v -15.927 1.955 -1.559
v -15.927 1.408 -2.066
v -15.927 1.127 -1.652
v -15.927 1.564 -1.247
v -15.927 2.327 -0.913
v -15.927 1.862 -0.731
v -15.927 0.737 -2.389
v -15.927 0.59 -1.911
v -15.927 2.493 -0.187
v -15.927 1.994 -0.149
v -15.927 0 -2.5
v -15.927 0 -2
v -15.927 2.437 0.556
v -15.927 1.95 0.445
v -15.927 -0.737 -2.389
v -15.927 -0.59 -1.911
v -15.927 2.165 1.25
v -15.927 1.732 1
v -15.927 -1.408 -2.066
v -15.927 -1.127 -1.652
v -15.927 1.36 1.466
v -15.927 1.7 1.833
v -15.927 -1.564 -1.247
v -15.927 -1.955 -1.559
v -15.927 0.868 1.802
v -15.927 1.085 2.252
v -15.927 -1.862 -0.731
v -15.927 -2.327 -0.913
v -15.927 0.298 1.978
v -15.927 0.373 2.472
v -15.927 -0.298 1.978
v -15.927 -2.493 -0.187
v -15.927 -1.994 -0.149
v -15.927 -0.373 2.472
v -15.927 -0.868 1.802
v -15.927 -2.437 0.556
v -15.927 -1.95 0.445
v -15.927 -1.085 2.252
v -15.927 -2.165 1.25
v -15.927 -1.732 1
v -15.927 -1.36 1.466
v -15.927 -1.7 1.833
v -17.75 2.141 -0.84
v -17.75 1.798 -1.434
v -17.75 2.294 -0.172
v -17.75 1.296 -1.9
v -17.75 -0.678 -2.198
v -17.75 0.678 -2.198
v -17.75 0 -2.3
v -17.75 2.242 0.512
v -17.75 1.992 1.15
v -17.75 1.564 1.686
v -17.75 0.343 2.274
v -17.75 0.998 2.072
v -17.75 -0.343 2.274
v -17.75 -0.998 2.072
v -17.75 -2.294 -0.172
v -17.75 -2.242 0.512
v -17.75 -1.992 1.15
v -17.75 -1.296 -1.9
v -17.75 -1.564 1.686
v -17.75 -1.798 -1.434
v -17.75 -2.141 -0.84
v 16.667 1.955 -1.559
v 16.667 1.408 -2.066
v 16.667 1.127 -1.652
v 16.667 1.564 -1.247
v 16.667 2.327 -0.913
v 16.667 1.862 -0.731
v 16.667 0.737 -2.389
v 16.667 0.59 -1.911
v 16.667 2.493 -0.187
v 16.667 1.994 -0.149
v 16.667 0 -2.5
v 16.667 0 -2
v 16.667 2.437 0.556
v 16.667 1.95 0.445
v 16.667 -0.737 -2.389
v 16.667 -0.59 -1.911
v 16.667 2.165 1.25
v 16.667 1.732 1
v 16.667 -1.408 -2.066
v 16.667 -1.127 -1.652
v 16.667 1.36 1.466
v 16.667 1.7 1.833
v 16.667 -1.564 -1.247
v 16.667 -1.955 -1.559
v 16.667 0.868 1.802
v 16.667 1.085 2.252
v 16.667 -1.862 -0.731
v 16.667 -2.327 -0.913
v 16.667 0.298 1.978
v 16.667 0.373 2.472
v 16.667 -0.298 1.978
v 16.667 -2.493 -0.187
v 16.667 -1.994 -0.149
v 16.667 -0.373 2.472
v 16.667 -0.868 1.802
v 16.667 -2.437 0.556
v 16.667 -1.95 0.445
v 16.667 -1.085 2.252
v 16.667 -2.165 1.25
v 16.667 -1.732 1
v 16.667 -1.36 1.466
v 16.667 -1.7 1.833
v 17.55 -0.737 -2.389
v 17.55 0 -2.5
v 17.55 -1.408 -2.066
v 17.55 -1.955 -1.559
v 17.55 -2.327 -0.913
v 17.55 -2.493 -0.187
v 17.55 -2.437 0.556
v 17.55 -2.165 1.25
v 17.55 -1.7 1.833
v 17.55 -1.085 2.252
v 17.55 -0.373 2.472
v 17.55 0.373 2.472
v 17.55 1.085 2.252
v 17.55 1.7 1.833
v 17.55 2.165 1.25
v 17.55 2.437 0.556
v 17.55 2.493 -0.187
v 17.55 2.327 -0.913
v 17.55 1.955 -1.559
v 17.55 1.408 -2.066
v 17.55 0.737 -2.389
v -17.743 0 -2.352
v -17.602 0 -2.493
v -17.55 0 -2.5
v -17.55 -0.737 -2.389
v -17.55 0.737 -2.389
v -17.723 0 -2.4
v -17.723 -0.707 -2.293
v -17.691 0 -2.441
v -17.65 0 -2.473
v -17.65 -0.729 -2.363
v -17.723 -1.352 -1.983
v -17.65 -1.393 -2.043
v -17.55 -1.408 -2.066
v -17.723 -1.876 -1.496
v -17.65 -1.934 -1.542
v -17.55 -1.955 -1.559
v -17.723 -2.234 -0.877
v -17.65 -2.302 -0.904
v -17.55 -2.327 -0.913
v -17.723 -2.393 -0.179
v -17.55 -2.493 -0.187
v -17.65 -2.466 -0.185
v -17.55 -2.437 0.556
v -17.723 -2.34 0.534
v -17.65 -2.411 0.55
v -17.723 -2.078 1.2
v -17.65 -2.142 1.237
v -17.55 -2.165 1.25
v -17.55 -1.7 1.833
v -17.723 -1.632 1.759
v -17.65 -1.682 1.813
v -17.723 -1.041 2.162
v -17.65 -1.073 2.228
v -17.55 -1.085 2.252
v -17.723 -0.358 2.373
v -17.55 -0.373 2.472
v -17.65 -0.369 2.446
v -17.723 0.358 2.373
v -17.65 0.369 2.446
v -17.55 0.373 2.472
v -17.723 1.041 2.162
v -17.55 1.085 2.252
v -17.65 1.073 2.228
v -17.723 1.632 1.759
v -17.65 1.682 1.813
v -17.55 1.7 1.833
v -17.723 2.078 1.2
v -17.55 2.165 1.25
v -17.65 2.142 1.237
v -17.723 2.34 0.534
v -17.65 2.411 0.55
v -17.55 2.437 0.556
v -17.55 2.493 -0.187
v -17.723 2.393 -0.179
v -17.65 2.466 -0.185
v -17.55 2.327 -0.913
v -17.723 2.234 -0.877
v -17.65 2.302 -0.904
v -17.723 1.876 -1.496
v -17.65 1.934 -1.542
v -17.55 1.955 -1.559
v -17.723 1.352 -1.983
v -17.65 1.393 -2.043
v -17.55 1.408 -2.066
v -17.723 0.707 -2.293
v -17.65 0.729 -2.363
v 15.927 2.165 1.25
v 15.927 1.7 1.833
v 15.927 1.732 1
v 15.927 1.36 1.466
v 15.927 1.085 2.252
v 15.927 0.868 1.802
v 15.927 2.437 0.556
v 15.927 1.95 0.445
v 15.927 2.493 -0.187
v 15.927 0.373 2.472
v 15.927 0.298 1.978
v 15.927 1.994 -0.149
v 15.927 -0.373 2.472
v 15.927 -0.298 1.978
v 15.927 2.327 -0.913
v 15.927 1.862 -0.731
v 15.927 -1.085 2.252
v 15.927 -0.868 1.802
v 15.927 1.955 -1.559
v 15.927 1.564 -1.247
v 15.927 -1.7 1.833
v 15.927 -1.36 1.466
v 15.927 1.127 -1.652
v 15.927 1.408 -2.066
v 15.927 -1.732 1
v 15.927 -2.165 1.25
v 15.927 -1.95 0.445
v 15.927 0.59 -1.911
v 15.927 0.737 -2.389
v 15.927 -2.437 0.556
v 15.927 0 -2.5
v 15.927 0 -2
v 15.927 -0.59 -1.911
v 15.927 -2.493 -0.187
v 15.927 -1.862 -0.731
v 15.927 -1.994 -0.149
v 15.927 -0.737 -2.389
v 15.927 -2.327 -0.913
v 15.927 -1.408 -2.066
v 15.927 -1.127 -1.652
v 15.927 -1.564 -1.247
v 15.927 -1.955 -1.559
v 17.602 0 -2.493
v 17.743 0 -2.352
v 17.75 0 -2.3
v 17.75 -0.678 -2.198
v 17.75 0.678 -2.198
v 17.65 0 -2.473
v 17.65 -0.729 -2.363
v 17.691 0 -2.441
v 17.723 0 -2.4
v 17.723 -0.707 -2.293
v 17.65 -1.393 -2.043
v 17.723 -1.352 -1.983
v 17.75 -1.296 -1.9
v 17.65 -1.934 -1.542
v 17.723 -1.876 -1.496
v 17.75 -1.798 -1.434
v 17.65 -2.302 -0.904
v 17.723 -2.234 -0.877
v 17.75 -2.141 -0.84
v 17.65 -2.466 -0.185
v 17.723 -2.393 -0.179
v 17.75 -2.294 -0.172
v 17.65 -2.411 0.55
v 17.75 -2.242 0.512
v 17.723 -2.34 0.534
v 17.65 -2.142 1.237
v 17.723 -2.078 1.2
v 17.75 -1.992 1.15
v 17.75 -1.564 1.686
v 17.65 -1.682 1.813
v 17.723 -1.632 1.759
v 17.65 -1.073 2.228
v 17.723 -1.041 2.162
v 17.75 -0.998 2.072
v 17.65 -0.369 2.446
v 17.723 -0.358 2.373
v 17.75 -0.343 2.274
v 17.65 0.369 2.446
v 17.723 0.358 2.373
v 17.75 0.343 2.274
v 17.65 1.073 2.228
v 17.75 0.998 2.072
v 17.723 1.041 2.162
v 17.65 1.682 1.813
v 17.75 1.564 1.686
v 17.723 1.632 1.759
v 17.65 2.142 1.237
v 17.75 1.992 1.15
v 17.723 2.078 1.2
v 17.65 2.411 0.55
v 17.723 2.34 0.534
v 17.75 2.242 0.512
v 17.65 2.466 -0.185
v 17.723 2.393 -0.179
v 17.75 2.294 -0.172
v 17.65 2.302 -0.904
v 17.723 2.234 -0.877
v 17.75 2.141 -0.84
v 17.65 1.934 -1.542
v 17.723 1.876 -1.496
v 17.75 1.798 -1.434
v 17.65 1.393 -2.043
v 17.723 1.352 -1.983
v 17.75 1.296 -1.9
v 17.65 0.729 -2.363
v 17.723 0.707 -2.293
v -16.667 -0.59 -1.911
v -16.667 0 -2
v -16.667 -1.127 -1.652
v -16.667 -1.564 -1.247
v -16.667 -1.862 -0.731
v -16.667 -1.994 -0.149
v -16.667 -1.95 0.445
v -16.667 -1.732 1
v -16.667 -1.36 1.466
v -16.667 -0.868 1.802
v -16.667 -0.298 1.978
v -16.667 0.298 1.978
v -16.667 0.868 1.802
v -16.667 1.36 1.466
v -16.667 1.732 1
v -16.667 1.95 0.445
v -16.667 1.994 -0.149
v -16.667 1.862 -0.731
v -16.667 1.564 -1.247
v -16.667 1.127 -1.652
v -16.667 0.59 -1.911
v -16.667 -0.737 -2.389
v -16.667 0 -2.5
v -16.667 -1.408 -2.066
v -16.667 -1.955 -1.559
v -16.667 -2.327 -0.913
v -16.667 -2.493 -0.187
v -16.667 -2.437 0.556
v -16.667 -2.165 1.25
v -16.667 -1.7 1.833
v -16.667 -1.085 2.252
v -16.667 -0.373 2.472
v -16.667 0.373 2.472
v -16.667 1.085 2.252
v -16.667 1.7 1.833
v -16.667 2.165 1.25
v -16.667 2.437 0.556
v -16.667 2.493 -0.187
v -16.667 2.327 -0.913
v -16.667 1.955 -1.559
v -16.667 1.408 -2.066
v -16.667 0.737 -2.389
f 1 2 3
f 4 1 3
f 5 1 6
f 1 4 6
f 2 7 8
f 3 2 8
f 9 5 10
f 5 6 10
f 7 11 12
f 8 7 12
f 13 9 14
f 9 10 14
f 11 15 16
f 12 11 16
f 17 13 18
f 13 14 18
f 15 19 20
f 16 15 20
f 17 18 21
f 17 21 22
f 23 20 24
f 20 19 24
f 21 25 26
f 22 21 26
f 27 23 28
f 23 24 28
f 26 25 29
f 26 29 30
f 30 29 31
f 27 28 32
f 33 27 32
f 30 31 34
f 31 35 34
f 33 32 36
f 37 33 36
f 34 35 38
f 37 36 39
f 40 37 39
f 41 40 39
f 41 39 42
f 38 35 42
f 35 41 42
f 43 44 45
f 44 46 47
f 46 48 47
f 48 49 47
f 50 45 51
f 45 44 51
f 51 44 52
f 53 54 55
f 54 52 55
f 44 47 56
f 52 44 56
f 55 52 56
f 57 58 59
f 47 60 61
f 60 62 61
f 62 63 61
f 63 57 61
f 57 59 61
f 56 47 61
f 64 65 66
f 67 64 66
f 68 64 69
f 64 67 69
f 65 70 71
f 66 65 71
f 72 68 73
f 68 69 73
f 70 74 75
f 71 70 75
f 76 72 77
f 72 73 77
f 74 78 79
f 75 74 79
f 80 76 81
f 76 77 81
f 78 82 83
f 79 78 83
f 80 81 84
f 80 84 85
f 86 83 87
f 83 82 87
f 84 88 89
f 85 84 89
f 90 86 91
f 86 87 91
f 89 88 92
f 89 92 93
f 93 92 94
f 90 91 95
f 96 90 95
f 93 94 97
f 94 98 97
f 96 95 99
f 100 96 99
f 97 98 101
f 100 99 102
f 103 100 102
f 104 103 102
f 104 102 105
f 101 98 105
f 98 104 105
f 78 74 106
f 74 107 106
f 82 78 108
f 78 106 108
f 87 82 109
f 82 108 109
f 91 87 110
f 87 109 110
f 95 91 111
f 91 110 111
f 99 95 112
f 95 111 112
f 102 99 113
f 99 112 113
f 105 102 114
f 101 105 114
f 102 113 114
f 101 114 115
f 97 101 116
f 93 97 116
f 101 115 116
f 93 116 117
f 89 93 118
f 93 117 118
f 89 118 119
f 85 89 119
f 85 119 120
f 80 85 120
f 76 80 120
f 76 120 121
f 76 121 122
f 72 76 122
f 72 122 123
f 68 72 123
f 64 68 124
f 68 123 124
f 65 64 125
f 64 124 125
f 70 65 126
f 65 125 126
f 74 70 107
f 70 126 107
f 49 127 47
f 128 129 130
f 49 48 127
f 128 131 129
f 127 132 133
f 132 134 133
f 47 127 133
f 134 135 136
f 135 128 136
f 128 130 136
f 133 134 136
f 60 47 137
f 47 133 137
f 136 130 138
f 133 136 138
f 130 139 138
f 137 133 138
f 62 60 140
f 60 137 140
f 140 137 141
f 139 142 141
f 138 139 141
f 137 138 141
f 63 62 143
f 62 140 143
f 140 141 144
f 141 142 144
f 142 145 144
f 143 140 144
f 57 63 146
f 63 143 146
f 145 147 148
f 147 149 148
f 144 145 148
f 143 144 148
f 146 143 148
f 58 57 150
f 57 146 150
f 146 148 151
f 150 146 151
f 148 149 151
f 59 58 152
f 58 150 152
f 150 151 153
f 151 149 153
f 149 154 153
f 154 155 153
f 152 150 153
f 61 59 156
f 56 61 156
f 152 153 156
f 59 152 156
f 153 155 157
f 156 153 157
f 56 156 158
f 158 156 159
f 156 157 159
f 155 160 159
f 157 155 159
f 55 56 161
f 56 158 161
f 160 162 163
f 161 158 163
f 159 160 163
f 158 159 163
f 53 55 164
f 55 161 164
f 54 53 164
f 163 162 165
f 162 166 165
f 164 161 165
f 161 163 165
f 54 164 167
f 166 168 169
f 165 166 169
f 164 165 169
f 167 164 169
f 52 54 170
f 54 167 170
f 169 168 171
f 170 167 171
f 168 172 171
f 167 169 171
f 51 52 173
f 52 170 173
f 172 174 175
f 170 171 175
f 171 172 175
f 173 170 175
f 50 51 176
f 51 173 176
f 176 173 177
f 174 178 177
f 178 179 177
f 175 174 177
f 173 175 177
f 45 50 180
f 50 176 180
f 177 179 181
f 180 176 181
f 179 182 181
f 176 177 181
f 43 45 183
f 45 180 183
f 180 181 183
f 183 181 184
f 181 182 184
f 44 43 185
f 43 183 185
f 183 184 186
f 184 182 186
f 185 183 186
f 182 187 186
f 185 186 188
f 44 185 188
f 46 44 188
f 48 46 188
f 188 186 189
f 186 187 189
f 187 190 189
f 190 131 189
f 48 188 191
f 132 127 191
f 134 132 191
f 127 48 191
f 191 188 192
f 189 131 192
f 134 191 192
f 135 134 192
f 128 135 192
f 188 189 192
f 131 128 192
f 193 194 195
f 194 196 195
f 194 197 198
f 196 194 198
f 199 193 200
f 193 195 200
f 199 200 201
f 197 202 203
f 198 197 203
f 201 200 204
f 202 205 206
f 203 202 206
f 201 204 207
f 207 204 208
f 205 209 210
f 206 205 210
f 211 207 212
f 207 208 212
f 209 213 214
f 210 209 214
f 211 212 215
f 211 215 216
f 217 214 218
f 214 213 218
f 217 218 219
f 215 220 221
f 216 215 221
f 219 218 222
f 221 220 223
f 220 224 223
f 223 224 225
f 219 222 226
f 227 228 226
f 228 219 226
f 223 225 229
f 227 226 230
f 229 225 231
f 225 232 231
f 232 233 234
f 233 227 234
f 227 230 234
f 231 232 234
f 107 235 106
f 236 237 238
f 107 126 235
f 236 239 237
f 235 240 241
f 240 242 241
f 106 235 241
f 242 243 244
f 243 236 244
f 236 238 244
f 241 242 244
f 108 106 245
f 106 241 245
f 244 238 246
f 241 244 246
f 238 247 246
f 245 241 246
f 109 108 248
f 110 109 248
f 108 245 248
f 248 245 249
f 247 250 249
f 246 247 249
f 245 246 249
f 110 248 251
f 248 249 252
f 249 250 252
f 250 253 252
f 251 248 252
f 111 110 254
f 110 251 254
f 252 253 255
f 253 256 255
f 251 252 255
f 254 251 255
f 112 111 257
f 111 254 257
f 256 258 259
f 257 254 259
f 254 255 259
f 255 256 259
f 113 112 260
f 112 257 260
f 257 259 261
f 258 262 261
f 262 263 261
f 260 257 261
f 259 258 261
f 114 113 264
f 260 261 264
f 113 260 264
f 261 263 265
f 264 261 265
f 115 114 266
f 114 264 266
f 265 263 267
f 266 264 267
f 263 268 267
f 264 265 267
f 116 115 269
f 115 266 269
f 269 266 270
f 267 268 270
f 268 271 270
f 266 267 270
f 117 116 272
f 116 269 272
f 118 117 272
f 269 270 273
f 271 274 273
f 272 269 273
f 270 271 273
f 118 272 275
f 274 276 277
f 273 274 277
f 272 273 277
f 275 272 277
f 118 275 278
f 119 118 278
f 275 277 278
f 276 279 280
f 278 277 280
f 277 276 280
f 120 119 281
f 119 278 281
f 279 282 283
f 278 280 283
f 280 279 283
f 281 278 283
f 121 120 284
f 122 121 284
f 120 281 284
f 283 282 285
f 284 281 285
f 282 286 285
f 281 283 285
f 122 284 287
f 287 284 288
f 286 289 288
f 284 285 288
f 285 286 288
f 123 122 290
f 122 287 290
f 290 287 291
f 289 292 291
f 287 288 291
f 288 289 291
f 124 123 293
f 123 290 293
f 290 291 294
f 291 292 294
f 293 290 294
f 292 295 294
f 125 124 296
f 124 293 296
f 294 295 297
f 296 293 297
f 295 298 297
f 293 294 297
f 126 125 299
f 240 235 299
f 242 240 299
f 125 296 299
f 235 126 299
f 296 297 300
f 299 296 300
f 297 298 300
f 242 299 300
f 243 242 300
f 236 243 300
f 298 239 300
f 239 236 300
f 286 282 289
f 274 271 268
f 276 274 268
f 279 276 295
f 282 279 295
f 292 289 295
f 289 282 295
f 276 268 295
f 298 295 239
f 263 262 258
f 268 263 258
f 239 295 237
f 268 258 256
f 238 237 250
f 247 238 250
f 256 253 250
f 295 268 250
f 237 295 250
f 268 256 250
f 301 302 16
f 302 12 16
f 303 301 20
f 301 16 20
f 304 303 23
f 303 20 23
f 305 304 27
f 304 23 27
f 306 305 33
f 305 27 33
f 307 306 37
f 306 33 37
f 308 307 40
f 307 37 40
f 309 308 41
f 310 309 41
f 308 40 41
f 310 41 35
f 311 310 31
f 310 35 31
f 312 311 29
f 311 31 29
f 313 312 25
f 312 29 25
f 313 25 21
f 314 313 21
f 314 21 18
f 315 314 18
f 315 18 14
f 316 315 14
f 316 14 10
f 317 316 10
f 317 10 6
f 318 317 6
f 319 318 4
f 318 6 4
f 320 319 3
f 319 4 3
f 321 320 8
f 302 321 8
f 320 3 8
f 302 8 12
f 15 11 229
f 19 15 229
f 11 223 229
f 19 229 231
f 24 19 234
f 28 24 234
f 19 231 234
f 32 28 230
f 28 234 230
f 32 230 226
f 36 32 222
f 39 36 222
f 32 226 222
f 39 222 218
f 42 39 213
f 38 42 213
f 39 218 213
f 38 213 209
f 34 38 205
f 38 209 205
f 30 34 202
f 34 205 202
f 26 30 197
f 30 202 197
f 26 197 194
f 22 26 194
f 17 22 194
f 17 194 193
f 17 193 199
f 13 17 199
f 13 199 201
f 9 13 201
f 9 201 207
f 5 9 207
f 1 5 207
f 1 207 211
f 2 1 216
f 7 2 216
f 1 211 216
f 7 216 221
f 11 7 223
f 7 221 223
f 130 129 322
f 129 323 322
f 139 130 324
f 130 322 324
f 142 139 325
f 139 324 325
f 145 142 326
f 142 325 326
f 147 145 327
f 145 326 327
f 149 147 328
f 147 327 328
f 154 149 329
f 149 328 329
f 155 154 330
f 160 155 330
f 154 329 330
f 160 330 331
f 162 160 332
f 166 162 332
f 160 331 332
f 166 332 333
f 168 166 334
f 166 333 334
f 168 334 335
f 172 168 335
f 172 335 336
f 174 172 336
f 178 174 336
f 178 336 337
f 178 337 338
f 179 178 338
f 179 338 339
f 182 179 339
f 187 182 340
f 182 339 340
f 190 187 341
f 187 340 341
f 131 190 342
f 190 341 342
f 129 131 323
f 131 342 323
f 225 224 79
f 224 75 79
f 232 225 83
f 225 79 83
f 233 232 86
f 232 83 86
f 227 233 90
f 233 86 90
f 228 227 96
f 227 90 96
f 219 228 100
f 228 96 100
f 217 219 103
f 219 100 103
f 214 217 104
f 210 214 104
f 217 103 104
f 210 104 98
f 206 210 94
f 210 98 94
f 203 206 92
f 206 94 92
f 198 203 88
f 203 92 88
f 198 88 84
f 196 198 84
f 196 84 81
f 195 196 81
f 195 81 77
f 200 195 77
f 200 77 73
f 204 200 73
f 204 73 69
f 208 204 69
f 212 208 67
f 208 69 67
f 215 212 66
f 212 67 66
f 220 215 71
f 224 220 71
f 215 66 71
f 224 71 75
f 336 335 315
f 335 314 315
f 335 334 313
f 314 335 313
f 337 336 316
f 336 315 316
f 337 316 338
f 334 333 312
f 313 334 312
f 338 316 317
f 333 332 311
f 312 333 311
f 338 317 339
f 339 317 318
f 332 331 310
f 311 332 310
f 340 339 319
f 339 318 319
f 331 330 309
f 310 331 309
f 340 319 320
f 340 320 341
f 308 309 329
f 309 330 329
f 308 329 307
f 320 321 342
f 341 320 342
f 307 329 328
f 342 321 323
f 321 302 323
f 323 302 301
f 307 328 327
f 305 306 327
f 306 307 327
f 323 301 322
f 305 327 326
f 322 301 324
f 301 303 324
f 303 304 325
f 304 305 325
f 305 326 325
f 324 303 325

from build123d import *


with BuildPart() as part:
    # Sketch1 → Revolve1 (revolve)
    with BuildSketch(Plane(origin=(0, 0, 0), x_dir=(1, 0, 0), z_dir=(0, 1, 0))):
        with BuildLine():
            Line((-15.927, 2.5), (15.927, 2.5))
            Line((15.927, 2.5), (15.927, 2))
            Line((15.927, 2), (16.667, 2))
            Line((16.667, 2), (16.667, 2.5))
            Line((16.667, 2.5), (17.55, 2.5))
            ThreePointArc((17.55, 2.5), (17.691421356, 2.441421356), (17.75, 2.3))
            Line((17.75, 2.3), (17.75, 0))
            Line((17.75, 0), (-17.75, 0))
            Line((-17.75, 0), (-17.75, 2.3))
            ThreePointArc((-17.75, 2.3), (-17.691421356, 2.441421356), (-17.55, 2.5))
            Line((-17.55, 2.5), (-16.667, 2.5))
            Line((-16.667, 2.5), (-16.667, 2))
            Line((-16.667, 2), (-15.927, 2))
            Line((-15.927, 2), (-15.927, 2.5))
        make_face()
    revolve(axis=Axis((17.75, 0, 0), (-1, 0, 0)))


solid = part.part
